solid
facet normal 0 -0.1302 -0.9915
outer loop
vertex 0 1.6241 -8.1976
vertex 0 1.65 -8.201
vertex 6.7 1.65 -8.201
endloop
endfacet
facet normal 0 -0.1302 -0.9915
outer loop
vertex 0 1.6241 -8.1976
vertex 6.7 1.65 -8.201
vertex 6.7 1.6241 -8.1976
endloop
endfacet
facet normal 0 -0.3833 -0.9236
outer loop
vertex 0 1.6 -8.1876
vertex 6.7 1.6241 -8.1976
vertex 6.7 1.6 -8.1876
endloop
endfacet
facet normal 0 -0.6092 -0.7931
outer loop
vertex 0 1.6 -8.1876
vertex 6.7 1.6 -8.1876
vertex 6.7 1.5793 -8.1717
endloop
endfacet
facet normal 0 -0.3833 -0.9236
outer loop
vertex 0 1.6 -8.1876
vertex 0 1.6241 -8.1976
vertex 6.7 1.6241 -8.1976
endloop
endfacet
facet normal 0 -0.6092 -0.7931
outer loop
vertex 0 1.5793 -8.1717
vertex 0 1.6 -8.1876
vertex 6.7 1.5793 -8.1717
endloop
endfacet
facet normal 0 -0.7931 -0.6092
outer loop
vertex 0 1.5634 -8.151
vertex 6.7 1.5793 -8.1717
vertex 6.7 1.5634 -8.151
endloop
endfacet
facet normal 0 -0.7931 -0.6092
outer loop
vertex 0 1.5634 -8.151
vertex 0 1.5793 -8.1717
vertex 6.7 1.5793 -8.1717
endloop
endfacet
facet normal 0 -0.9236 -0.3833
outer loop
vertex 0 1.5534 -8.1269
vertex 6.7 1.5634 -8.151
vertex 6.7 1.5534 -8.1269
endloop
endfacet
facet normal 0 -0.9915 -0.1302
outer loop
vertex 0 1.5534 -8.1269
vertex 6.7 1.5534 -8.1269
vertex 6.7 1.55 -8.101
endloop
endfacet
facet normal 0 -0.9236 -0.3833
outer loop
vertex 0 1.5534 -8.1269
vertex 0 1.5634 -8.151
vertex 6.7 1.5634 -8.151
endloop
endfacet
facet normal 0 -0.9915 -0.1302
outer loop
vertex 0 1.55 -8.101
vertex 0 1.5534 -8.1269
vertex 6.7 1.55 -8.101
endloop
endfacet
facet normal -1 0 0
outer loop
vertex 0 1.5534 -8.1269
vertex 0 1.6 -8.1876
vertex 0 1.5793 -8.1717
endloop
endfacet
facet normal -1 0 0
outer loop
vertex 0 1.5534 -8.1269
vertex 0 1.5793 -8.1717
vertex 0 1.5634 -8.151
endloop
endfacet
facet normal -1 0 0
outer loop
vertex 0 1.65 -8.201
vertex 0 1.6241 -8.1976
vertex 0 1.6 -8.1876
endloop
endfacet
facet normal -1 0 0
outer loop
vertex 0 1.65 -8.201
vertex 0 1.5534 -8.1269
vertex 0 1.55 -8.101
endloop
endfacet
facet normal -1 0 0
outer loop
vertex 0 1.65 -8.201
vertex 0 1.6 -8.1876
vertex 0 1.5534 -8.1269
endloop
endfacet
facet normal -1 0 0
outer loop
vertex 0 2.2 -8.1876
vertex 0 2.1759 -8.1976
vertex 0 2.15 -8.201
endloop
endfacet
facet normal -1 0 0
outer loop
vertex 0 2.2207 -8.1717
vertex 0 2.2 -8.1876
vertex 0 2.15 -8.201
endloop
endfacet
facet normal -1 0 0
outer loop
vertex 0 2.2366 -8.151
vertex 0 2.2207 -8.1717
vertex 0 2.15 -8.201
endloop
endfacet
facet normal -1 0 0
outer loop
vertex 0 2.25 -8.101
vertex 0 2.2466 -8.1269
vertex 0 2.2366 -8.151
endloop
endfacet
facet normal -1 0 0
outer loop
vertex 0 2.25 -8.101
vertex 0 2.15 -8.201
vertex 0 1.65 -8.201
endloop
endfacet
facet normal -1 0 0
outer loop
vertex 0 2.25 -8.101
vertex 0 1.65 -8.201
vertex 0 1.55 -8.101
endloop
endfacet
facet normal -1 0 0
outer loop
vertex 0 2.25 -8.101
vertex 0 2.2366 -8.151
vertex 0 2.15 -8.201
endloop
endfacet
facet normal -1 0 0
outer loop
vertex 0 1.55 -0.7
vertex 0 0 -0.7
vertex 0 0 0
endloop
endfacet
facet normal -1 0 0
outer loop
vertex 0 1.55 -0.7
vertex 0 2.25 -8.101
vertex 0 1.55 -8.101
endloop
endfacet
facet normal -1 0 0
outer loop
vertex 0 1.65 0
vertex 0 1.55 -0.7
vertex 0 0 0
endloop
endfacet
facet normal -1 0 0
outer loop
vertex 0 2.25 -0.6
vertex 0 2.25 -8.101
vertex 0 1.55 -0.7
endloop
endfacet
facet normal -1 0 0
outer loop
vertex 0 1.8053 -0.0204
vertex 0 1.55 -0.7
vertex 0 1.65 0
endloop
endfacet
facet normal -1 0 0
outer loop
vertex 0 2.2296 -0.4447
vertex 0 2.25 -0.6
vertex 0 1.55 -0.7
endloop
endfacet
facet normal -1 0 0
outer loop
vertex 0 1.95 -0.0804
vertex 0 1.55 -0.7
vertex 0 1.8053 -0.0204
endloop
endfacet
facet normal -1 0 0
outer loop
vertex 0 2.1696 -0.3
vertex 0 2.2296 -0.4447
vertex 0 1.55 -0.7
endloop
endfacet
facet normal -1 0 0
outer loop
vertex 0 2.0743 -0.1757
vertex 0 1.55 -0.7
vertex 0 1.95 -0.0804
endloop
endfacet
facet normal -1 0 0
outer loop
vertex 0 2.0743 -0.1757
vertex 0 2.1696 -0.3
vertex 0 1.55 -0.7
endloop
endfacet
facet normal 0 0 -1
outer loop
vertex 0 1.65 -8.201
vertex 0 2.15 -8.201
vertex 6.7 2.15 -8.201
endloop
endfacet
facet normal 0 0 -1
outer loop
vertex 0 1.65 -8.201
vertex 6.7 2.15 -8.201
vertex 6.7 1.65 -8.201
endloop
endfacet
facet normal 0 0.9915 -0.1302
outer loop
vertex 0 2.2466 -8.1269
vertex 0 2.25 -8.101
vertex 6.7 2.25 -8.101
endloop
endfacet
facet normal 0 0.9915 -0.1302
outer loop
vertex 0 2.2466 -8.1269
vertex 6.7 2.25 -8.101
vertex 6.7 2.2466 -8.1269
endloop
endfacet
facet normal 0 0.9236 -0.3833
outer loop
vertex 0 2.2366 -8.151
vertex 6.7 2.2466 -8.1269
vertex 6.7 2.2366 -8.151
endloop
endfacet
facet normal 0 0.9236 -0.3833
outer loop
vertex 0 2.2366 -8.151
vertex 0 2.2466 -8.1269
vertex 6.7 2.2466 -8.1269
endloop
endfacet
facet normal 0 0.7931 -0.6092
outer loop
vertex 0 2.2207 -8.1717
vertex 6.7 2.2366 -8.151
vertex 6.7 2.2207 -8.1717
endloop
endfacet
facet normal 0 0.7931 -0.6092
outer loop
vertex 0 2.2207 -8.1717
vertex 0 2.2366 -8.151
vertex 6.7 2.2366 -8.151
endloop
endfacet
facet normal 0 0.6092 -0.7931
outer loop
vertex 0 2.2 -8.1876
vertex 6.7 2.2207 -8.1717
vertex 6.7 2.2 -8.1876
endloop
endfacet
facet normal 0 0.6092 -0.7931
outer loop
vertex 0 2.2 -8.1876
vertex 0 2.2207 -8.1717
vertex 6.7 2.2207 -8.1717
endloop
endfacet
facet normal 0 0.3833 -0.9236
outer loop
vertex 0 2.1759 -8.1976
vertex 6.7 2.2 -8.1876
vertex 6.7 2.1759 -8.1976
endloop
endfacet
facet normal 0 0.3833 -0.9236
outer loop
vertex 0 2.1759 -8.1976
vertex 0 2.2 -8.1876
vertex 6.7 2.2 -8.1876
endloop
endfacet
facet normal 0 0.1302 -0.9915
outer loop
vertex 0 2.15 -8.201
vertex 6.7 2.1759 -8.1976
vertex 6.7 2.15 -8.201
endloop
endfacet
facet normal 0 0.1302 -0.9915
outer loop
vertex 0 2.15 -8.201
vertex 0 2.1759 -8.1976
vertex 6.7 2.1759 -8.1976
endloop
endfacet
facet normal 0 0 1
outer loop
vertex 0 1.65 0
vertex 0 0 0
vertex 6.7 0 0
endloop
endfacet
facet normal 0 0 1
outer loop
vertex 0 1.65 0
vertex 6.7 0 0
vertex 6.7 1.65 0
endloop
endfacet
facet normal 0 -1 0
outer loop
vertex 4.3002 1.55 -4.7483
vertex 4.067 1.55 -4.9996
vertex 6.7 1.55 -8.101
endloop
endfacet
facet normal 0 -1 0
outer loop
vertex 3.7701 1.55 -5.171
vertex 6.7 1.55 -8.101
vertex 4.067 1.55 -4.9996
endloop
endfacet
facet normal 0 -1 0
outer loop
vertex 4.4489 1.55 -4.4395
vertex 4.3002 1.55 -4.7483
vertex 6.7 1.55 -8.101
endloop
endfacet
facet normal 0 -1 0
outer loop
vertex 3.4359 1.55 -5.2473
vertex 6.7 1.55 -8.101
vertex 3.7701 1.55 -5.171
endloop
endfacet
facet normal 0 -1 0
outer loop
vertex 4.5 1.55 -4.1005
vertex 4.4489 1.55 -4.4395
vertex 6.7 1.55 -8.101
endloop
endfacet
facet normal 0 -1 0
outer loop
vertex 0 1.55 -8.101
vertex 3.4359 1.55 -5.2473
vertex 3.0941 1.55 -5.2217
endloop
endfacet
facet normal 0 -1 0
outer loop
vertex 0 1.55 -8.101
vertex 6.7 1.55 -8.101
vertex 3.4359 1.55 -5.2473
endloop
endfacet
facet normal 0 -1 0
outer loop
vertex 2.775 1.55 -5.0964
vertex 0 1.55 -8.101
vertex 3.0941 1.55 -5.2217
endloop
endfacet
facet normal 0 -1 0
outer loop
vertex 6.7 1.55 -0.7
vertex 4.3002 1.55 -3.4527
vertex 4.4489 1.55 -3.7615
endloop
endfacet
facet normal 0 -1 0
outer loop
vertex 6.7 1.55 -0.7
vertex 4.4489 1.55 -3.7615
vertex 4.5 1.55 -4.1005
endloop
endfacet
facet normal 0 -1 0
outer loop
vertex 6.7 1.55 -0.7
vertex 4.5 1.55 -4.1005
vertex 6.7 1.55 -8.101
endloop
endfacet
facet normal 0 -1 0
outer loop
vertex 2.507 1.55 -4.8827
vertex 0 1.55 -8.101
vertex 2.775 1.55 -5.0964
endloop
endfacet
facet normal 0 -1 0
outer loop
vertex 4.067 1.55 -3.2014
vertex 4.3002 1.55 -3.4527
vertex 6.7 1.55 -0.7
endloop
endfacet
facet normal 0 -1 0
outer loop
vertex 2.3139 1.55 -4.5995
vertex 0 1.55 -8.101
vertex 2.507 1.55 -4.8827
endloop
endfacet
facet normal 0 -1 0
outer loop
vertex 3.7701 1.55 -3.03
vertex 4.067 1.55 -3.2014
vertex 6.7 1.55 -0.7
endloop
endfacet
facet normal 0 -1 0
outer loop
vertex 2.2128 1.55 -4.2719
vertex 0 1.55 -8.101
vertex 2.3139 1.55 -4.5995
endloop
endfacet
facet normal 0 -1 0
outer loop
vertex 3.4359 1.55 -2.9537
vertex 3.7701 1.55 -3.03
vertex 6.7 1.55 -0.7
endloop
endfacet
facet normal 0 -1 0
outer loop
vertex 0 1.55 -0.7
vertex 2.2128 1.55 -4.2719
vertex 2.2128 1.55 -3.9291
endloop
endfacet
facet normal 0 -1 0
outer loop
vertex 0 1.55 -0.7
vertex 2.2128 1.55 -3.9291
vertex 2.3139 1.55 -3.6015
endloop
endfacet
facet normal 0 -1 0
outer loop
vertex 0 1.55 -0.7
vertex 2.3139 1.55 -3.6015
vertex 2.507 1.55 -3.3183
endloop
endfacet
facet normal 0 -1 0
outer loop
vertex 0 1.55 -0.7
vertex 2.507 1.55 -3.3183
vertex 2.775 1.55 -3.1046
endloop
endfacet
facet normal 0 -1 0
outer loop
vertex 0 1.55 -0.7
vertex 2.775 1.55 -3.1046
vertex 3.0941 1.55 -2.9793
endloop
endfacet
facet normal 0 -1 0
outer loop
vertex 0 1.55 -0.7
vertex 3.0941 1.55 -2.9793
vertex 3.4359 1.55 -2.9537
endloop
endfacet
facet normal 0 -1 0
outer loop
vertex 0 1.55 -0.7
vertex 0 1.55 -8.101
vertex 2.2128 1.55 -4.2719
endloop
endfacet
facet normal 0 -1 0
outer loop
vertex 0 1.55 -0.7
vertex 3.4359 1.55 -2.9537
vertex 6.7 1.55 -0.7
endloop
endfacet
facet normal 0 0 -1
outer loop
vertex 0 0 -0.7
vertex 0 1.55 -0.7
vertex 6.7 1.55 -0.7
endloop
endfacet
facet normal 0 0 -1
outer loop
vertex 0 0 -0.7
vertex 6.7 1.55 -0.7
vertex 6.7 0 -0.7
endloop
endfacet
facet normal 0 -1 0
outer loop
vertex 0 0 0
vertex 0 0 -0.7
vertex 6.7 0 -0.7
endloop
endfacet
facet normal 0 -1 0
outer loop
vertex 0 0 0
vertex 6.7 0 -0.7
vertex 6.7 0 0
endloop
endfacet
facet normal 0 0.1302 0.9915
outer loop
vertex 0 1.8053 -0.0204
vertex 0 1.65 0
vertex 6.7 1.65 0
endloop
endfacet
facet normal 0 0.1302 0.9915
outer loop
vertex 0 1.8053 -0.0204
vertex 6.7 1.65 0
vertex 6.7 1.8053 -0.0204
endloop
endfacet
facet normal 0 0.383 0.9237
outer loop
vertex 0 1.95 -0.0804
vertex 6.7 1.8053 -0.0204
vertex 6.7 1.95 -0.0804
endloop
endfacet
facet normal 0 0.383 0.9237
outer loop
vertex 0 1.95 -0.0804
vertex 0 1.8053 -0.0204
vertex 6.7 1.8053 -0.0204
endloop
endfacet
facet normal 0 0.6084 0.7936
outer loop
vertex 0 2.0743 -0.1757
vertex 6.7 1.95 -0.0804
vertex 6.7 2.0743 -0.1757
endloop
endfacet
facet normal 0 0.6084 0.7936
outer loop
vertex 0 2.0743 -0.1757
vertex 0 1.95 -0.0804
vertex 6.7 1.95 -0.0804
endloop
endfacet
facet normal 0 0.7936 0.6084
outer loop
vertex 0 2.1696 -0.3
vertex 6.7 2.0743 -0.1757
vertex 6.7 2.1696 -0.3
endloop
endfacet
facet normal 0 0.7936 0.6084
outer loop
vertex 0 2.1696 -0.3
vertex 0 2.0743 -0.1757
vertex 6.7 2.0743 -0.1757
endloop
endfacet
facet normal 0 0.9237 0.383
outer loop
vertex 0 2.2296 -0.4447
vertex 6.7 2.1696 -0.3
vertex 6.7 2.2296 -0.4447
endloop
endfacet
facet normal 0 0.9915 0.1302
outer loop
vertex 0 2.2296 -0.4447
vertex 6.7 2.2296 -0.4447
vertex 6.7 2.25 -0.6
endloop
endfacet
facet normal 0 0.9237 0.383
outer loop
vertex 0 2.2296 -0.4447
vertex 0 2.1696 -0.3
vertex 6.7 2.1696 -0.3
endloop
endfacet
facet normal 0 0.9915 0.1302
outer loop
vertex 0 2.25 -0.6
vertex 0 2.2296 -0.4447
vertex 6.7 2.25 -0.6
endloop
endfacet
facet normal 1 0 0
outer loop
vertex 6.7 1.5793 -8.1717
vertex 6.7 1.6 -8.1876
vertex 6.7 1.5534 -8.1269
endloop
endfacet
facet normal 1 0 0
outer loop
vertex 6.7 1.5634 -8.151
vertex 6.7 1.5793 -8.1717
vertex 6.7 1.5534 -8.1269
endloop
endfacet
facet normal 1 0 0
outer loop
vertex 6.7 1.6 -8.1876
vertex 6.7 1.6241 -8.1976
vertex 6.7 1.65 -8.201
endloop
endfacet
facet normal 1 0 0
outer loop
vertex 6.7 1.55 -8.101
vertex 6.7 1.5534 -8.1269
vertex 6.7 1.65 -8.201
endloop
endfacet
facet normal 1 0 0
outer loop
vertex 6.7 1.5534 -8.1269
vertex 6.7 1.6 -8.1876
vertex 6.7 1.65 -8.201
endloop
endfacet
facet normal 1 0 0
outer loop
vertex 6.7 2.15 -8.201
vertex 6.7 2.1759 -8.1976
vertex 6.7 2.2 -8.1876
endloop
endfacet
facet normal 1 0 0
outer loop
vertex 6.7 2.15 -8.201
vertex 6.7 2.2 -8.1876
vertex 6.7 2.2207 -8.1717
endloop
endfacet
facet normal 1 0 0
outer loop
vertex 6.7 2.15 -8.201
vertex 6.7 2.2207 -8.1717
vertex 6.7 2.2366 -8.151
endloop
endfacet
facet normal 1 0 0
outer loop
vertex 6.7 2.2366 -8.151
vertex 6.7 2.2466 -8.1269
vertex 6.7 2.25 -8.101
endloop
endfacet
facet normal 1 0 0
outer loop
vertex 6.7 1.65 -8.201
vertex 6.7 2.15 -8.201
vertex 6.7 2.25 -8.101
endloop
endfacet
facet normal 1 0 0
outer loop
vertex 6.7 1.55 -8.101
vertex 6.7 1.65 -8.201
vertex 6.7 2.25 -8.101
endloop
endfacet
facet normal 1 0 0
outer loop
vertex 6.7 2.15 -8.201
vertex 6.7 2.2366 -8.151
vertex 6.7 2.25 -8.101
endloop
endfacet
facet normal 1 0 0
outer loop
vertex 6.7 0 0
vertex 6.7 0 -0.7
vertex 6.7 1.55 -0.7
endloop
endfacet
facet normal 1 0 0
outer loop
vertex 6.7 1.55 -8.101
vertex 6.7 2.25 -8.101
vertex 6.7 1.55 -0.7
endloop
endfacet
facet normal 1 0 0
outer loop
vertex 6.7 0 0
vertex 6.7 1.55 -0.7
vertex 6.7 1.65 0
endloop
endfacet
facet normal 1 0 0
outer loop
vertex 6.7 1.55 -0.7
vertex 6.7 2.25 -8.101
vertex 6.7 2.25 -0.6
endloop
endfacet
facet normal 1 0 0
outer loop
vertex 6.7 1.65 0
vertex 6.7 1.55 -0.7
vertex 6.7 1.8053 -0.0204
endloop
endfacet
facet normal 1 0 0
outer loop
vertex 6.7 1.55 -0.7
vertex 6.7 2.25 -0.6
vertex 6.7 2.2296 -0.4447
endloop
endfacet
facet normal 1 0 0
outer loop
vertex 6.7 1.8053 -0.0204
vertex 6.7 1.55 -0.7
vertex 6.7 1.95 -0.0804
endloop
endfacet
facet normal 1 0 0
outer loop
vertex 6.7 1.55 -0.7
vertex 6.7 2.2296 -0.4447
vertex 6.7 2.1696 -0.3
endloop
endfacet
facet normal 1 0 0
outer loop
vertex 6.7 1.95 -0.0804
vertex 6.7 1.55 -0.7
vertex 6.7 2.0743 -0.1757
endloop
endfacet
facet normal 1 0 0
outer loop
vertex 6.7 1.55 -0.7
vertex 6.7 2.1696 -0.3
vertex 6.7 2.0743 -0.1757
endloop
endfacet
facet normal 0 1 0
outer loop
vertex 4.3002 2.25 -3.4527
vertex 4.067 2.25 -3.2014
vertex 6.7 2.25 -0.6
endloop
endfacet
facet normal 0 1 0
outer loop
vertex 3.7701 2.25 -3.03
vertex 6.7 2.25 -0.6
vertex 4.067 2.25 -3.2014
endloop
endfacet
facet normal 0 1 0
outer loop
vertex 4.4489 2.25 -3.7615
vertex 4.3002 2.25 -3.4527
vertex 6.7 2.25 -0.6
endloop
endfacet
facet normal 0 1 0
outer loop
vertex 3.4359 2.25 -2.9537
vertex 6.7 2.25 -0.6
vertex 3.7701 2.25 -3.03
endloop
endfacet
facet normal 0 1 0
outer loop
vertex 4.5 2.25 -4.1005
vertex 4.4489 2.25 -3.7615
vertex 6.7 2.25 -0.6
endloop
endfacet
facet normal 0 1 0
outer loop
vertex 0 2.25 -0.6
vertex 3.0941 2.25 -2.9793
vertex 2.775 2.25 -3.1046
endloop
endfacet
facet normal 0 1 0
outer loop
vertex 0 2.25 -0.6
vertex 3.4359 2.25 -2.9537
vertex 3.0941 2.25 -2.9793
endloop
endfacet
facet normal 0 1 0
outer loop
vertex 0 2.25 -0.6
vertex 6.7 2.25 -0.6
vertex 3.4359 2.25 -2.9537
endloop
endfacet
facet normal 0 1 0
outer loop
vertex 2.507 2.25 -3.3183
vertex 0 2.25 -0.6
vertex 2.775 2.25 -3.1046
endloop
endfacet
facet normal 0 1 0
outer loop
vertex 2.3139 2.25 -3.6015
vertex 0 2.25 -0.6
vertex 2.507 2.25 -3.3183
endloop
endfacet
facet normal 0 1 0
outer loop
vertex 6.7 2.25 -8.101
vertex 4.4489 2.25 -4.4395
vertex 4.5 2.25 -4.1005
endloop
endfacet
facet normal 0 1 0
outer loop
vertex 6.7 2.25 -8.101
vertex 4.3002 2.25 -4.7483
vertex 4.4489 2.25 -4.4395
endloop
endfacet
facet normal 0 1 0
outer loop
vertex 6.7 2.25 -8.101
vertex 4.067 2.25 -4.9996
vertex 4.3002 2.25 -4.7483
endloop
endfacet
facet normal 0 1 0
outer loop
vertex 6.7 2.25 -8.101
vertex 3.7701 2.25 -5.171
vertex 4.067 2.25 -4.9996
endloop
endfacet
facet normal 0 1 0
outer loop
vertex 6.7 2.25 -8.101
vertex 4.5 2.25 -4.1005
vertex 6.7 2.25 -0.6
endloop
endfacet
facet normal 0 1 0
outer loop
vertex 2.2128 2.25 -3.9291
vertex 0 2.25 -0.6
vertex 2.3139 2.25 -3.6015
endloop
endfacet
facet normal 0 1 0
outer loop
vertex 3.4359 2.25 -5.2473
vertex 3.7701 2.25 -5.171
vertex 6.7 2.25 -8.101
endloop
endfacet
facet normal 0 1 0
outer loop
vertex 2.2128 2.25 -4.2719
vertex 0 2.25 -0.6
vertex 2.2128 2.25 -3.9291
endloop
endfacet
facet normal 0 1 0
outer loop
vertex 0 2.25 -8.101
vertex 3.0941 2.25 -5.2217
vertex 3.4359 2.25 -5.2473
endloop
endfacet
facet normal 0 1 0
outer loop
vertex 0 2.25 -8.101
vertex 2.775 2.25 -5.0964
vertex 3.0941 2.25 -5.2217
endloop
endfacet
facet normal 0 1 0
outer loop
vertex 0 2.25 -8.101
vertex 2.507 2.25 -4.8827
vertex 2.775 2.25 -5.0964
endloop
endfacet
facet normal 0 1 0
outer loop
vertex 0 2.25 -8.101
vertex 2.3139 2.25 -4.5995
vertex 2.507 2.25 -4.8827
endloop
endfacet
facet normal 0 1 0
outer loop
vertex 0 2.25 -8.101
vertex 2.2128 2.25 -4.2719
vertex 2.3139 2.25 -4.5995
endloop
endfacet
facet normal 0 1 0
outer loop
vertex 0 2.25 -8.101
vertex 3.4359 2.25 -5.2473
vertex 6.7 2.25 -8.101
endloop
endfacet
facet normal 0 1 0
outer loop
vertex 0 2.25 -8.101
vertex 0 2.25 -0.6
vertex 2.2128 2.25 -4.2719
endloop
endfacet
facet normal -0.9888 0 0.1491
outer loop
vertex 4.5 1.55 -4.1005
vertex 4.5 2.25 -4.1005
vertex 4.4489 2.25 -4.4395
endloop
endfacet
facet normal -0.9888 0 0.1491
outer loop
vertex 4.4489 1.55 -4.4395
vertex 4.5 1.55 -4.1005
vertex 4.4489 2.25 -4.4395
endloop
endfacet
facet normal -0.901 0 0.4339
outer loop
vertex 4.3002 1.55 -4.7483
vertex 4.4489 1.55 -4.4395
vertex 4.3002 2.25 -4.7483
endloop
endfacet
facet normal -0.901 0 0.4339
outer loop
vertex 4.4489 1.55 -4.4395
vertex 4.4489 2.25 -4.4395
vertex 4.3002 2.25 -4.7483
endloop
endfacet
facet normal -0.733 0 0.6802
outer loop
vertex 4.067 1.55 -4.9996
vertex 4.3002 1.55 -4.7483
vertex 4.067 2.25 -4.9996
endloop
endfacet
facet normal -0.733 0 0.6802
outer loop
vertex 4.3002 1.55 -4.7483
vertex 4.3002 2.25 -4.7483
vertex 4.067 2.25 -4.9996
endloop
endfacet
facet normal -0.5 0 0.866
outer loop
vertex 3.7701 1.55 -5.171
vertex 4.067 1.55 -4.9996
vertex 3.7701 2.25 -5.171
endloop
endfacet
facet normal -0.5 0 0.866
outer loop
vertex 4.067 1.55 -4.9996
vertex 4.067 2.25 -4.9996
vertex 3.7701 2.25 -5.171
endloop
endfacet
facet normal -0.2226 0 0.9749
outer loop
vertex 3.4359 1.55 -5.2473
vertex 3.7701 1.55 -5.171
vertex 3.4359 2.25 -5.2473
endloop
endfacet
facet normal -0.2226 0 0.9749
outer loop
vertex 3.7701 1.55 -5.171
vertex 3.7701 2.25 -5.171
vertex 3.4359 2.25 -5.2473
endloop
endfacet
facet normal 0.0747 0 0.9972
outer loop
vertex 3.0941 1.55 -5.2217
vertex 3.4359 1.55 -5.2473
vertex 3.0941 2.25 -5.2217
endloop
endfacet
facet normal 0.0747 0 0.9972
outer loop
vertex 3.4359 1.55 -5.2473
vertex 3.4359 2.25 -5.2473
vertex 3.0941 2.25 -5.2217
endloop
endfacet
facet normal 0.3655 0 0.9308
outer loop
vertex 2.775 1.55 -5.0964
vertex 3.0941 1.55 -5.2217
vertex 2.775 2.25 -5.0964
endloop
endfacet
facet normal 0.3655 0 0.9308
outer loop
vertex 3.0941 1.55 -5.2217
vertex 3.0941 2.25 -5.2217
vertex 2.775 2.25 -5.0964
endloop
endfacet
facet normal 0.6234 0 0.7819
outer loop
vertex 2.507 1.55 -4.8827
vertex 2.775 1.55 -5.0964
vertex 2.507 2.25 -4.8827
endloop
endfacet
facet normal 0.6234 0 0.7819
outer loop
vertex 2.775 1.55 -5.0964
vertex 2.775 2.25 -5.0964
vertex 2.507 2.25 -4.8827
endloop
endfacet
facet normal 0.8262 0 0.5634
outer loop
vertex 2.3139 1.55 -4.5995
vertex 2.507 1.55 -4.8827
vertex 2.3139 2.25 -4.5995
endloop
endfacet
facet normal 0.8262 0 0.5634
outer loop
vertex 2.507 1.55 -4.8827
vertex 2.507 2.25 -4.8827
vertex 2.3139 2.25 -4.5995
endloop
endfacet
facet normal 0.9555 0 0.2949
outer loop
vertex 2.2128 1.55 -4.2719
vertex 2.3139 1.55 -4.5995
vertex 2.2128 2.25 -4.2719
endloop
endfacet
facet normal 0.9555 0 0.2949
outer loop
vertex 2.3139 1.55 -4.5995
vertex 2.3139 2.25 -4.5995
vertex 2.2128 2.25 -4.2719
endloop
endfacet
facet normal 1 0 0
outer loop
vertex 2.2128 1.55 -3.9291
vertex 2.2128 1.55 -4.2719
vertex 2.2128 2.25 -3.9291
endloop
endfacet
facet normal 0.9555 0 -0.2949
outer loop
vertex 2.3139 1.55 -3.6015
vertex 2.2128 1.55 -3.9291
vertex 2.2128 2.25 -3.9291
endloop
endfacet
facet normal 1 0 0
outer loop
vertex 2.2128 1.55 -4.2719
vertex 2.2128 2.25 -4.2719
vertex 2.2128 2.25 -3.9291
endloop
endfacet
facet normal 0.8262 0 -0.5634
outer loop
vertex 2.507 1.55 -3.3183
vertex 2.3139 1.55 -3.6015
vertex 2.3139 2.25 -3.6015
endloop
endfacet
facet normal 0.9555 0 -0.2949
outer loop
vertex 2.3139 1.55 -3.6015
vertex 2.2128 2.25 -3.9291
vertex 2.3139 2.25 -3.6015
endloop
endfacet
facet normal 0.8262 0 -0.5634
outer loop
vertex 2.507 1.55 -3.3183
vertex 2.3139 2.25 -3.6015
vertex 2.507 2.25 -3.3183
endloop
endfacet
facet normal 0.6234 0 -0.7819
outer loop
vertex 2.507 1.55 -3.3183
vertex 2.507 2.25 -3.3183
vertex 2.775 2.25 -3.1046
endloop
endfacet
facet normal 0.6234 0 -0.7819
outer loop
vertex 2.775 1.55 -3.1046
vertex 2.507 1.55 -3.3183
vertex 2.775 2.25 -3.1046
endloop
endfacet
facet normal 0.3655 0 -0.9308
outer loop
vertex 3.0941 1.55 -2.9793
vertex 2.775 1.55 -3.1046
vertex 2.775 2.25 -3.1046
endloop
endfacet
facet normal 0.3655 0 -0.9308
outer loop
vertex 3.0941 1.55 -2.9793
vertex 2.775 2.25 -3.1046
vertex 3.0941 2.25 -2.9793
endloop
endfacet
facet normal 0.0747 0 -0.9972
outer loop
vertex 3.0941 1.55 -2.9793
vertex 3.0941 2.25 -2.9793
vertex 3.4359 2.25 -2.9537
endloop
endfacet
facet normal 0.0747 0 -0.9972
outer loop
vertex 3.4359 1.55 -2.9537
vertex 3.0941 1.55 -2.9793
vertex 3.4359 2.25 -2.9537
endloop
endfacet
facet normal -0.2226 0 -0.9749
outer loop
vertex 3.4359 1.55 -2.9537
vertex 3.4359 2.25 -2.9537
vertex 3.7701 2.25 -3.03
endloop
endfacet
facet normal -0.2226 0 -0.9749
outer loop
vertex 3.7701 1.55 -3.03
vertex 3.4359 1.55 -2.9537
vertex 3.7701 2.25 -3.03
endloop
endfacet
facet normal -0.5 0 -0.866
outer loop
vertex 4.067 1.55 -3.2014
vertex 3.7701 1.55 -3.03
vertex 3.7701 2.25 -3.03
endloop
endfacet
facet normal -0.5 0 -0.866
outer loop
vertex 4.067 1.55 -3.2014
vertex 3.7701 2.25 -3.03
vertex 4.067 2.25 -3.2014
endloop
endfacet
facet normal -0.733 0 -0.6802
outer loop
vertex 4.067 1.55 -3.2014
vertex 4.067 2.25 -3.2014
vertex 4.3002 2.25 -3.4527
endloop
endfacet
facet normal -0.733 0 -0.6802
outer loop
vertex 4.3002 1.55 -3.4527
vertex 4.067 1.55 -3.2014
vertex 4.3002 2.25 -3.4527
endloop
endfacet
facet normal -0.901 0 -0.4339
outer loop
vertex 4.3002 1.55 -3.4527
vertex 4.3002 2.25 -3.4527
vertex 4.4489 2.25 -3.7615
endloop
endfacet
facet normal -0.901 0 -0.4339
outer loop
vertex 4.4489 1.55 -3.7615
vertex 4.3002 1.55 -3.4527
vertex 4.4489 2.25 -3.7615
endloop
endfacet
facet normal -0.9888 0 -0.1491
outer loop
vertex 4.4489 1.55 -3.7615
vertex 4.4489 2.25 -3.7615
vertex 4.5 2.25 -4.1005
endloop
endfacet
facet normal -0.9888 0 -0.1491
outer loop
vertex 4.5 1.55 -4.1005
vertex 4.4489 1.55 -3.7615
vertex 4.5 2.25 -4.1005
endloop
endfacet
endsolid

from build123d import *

# Parameters (mm, degrees)
RESSALTO_EXTRUS_O12_DEPTH = 6.7
ESBO_O7_R                 = 1.15
CORTE_EXTRUS_O3_DEPTH     = 6.7


with BuildPart() as part:
    # Esboço4 → Ressalto-extrusão12 (new body)
    with BuildSketch(Plane(origin=(0, 0, 0), x_dir=(0, 0, -1), z_dir=(1, 0, 0))):
        with BuildLine():
            Line((0, 0), (0, 1.65))
            ThreePointArc((0, 1.65), (0.175735931, 2.074264069), (0.6, 2.25))
            Line((0.6, 2.25), (8.101, 2.25))
            ThreePointArc((8.101, 2.25), (8.171710678, 2.220710678), (8.201, 2.15))
            Line((8.201, 2.15), (8.201, 1.65))
            ThreePointArc((8.201, 1.65), (8.171710678, 1.579289322), (8.101, 1.55))
            Line((8.101, 1.55), (0.7, 1.55))
            Line((0.7, 1.55), (0.7, 0))
            Line((0.7, 0), (0, 0))
        make_face()
    extrude(amount=RESSALTO_EXTRUS_O12_DEPTH)

    # Esboço7 → Corte-extrusão3 (cut)
    with BuildSketch(Plane(origin=(0, 2.25, 0), x_dir=(1, 0, 0), z_dir=(0, 1, 0))):
        with Locations((3.35, 4.1005)):
            Circle(ESBO_O7_R)
    extrude(amount=-CORTE_EXTRUS_O3_DEPTH, mode=Mode.SUBTRACT)


solid = part.part
